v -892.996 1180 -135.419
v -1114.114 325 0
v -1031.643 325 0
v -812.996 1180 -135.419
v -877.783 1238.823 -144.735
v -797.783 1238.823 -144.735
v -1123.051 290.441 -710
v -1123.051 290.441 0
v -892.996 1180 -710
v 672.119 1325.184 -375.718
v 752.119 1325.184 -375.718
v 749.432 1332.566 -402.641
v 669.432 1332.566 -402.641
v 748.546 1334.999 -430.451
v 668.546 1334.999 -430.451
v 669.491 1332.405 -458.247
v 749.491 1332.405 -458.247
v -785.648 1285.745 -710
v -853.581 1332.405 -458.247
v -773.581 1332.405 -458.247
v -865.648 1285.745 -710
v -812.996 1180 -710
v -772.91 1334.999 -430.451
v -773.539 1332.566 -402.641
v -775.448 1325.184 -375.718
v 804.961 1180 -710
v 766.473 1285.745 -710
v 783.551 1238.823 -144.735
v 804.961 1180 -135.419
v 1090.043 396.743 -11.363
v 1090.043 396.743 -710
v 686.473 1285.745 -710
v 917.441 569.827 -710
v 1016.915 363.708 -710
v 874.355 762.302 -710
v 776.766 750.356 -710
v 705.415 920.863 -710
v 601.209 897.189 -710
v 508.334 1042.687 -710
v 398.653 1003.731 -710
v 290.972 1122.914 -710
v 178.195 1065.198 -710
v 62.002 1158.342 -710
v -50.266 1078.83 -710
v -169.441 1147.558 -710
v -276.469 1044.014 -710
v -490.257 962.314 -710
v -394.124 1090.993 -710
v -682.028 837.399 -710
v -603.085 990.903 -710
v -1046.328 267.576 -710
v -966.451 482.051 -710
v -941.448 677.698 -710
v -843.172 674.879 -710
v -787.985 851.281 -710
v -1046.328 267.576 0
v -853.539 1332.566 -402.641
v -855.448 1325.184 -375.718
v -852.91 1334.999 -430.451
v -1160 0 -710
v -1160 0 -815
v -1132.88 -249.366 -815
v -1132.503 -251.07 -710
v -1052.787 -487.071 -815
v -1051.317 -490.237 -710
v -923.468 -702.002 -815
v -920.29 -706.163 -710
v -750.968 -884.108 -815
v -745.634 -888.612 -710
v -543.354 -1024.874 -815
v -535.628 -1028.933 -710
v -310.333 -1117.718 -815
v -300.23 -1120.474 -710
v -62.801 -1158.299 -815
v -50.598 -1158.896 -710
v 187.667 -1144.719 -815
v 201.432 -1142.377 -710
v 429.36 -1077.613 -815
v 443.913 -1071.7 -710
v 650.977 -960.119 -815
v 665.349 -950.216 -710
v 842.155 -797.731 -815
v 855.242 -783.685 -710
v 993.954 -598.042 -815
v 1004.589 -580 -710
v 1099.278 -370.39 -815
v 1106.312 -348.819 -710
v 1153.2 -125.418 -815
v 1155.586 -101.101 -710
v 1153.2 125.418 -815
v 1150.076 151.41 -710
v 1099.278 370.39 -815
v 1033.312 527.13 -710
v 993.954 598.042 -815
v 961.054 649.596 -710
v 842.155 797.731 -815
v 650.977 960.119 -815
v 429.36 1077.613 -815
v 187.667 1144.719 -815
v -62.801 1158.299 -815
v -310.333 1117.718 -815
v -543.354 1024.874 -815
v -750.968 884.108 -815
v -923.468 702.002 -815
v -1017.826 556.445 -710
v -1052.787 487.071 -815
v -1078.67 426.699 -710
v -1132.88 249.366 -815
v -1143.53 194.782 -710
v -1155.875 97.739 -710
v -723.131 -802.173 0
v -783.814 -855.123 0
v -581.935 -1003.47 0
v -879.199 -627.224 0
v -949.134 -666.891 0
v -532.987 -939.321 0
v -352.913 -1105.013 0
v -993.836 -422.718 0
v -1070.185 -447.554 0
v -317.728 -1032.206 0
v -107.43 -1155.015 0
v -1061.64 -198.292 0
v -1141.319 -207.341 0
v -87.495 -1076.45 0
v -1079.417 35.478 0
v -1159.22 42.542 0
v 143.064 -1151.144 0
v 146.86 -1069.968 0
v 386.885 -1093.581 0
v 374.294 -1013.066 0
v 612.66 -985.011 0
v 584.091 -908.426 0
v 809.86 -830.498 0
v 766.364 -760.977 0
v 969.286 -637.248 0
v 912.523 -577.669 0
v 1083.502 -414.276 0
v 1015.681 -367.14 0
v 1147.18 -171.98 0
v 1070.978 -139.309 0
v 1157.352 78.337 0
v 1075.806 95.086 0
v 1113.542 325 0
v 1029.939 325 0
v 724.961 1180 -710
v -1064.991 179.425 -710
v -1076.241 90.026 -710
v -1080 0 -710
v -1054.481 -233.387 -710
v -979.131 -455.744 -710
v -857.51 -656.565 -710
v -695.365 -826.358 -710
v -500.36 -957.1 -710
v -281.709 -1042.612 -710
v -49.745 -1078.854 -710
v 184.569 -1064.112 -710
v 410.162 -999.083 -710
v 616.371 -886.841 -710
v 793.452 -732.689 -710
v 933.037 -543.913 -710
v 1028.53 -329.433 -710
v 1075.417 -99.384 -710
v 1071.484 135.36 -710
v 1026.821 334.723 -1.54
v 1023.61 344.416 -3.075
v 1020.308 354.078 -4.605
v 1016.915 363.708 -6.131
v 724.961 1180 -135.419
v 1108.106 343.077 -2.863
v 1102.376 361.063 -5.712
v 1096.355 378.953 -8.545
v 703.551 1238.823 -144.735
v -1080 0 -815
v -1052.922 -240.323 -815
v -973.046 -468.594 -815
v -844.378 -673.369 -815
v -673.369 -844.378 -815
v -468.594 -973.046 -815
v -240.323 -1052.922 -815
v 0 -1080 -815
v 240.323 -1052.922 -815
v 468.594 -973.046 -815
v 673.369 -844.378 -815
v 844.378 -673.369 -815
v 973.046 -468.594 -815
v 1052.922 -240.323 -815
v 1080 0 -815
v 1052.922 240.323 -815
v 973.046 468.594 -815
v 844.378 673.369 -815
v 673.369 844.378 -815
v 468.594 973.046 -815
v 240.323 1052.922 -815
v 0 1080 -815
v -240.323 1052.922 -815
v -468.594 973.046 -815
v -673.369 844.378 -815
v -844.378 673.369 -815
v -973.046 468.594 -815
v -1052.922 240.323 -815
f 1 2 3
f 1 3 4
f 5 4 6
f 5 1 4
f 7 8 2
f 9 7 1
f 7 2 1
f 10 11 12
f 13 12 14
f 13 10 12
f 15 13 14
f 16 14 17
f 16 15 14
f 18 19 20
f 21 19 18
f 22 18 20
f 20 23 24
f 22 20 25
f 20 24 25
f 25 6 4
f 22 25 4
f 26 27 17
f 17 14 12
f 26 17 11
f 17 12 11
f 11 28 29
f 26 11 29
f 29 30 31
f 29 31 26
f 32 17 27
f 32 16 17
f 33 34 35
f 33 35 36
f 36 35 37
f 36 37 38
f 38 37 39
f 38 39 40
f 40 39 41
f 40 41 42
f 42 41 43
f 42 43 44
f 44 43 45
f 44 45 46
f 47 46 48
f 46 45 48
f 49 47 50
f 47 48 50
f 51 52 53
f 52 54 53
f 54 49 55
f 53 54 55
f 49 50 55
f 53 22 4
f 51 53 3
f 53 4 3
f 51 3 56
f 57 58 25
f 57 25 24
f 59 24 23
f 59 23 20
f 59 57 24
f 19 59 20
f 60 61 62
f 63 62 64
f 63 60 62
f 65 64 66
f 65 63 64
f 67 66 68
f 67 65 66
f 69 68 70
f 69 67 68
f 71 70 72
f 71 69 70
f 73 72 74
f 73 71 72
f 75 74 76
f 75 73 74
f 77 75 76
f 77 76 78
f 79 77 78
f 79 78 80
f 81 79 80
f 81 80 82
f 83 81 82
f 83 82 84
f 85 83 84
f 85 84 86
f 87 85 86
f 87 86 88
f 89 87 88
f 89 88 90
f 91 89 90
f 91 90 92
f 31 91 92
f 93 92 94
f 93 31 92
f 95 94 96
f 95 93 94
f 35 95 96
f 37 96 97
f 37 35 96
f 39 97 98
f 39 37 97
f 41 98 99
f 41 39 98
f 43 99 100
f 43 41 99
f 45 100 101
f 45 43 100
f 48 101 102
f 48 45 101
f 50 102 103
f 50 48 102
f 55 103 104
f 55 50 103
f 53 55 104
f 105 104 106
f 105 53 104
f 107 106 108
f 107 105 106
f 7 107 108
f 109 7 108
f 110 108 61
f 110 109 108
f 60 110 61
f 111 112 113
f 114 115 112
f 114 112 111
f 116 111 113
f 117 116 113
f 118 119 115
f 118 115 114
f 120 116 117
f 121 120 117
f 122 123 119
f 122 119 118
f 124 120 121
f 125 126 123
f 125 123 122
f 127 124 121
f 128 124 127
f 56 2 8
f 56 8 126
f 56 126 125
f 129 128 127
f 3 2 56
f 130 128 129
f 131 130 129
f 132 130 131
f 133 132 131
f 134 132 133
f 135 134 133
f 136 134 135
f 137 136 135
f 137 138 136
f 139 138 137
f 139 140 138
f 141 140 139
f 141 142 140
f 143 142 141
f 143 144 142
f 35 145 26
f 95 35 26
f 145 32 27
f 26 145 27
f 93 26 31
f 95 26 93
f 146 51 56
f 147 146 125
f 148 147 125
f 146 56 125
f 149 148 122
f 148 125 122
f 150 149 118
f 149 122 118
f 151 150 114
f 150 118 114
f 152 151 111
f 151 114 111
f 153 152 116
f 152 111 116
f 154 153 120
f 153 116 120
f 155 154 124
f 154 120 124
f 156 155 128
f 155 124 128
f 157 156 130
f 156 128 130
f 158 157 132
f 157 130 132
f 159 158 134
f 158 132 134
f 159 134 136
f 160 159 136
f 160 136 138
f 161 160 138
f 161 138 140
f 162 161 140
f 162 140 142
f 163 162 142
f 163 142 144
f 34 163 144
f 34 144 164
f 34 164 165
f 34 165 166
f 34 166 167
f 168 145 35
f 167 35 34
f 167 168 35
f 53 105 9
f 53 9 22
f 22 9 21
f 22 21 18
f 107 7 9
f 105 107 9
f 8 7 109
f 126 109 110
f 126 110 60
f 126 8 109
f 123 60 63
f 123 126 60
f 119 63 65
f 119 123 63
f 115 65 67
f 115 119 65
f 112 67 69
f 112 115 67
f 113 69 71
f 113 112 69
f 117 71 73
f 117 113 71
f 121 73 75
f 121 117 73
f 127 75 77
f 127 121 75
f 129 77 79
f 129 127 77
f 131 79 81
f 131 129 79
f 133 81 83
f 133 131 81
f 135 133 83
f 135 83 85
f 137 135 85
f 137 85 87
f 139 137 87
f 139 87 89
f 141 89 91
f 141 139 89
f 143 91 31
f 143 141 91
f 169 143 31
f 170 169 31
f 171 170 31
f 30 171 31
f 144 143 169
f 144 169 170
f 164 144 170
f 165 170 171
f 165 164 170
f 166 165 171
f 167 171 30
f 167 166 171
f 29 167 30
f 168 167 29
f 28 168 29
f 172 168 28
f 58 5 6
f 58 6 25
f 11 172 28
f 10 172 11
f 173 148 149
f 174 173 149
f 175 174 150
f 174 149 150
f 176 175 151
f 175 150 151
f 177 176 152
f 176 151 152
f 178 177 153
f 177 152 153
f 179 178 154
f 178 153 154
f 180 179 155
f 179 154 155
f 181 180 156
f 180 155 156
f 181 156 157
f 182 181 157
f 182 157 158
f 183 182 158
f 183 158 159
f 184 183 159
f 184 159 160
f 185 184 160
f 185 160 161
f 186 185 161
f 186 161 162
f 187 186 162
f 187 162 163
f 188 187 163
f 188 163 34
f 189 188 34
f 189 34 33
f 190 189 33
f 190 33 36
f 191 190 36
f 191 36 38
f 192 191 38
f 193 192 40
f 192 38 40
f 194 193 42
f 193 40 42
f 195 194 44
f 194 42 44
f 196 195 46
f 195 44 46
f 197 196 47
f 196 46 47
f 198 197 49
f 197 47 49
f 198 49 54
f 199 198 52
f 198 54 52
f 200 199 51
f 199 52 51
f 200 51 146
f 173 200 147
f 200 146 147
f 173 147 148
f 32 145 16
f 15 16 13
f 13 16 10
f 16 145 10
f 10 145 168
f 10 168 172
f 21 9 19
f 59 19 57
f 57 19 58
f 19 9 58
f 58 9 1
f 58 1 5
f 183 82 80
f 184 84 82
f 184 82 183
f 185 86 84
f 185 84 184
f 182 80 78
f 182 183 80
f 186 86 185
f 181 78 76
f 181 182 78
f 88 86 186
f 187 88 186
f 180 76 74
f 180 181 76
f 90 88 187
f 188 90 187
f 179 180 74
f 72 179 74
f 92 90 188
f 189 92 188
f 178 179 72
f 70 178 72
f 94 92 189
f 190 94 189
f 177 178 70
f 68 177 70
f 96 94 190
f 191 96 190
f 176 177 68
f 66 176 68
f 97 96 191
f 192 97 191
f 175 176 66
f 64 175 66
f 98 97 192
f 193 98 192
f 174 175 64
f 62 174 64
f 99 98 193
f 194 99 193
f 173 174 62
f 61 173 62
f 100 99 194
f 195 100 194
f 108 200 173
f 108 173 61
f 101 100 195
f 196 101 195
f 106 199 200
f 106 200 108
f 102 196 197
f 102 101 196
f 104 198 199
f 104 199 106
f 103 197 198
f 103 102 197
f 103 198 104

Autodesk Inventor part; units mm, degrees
ref_plane "YZ Plane" through (0, 0, 0) normal (1, 0, 0) x (0, 1, 0)
ref_plane "XZ Plane" through (0, 0, 0) normal (0, 1, 0) x (-1, 0, 0)
ref_plane "XY Plane" through (0, 0, 0) normal (0, 0, 1) x (1, 0, 0)
sketch "Sketch1" plane through (0, 0, 0) normal (0, 0, 1) x (1, 0, 0)
  arc A0 (-1040.213506, 290.440805) -> (1016.915041, 363.708398) centre (0, 0) ccw
  arc A1 (-1123.051263, 290.440805) -> (1090.04344, 396.743366) centre (0, 0) ccw
  line L0 (-1123.051263, 290.440805) -> (-892.995613, 1180)
  line L1 (-1123.051263, 290.440805) -> (-204.225292, 290.440805) construction
  line L2 (1090.04344, 396.743366) -> (804.96134, 1180)
  line L3 (1090.04344, 396.743366) -> (1923.56774, 396.743366) construction
  line L4 (0, 0) -> (0, 1180) construction
  line L5 (0, 1180) -> (1900.808505, 1180) construction
  line L6 (1900.808505, 1180) -> (-2124.970927, 1180) construction
  line L7 (804.96134, 1180) -> (724.96134, 1180) construction
  line L8 (804.96134, 1180) -> (724.96134, 1180)
  line L9 (724.96134, 1180) -> (1016.915041, 363.708398)
  line L10 (-892.995613, 1180) -> (-812.995613, 1180)
  line L11 (-812.995613, 1180) -> (-1046.3284, 267.575934)
  line L12 (-892.995613, 1180) -> (-706.077385, 1902.759157)
  line L13 (-706.077385, 1902.759157) -> (-626.077385, 1902.759157)
  line L14 (-626.077385, 1902.759157) -> (-812.995613, 1180)
  line L15 (724.96134, 1180) -> (461.89852, 1902.759157)
  line L16 (461.89852, 1902.759157) -> (541.89852, 1902.759157)
  line L17 (541.89852, 1902.759157) -> (804.96134, 1180)
  dimension "d1" = 2160
  dimension "d2" = 2320
  dimension "d4" = 80
  dimension "d5" = 75.5
  dimension "d6" = 110
  dimension "d7" = 1180
  dimension "d8" = 80
  dimension "d9" = 80
extrude "Extrusion1" add sketch "Sketch1" against normal blind 710
ref_plane "Work Plane1" through (0, 0, 0) normal (1, 0, 0) x (0, 1, 0)
sketch "Sketch2" plane through (0, 0, 0) normal (1, 0, 0) x (0, 1, 0)
  line L0 (0, 0) -> (325, 0) construction
  line L1 (396.743366, 0) -> (-1160, 0) construction
  line L2 (325, 0) -> (325, -710) construction
  line L3 (-1160, -710) -> (396.743366, -710) construction
  line L4 (325, 0) -> (2190.73627, -295.503595)
  line L5 (325, 0) -> (2213.992907, 0) construction
  line L6 (2190.73627, -295.503595) -> (2190.73627, 0)
  line L7 (1902.759157, 0) -> (1902.759157, -710)
  line L8 (2190.73627, 0) -> (325, 0)
  line L9 (0, -815) -> (0, -430) construction
  line L10 (0, -430) -> (1180, -430) construction
  line L11 (1180, -430) -> (2009.151875, -357.458611) construction
  line L12 (1180, -430) -> (1334.410178, -416.49086) construction
  arc A0 (1180, -416.49086) -> (1180, -430) centre (1257.205089, -423.24543) ccw
  line L13 (1334.410178, -416.49086) -> (1425.077731, -416.49086) construction
  circle A1 centre (1180, -430) radius 155
  line L14 (1325.184189, -375.717856) -> (1238.82339, -144.735406)
  line L15 (1325.184189, -375.717856) -> (1634.970705, -375.717856) construction
  line L16 (1332.404511, -458.246506) -> (1285.744759, -710)
  line L17 (1332.404511, -458.246506) -> (1864.039818, -458.246506) construction
  line L18 (0, -815) -> (0, -710) construction
  line L19 (0, -710) -> (1902.759157, -710) construction
  line L20 (1285.744759, -710) -> (685.744759, -710)
  line L21 (685.744759, -710) -> (685.744759, -815)
  line L22 (685.744759, -815) -> (0, -815)
  line L23 (685.744759, -815) -> (1902.759157, -815)
  point P0 (290.440805, 0)
  point P1 (396.743366, -710)
  point P2 (290.440805, -710)
  point P3 (1902.759157, -249.892501)
  dimension "d13" = 325
  dimension "d14" = 9
  dimension "d17" = 385
  dimension "d18" = 1180
  dimension "d19" = 175
  dimension "d20" = 155
  dimension "d22" = 110.5
  dimension "d23" = 100.5
  dimension "d24" = 105
  dimension "d25" = 600
sketch "Sketch2 outline for Extrusion2" plane through (0, 0, 0) normal (1, 0, 0) x (0, 1, 0)
  line L0 (2190.73627, -295.503595) -> (2190.73627, 0)
  line L1 (2190.73627, 0) -> (325, 0)
  line L2 (325, 0) -> (1238.82339, -144.735406)
  line L3 (1238.82339, -144.735406) -> (1325.184189, -375.717856)
  arc A0 (1325.184189, -375.717856) -> (1332.404511, -458.246506) centre (1180, -430) cw
  line L4 (1332.404511, -458.246506) -> (1285.744759, -710)
  line L5 (1285.744759, -710) -> (685.744759, -710)
  line L6 (685.744759, -710) -> (685.744759, -815)
  line L7 (685.744759, -815) -> (1902.759157, -710)
  line L8 (1902.759157, -710) -> (1902.759157, -249.892501)
  line L9 (1902.759157, -249.892501) -> (2190.73627, -295.503595)
extrude "Extrusion2" cut sketch "Sketch2 outline for Extrusion2" along normal through all both and the other way through all
sketch "Sketch5" plane through (0, 0, -710) normal (0, 0, -1) x (-1, 0, 0)
  circle A0 centre (0, 0) radius 1080
  circle A1 centre (0, 0) radius 1160
extrude "Extrusion3" add sketch "Sketch5" along normal blind 105
